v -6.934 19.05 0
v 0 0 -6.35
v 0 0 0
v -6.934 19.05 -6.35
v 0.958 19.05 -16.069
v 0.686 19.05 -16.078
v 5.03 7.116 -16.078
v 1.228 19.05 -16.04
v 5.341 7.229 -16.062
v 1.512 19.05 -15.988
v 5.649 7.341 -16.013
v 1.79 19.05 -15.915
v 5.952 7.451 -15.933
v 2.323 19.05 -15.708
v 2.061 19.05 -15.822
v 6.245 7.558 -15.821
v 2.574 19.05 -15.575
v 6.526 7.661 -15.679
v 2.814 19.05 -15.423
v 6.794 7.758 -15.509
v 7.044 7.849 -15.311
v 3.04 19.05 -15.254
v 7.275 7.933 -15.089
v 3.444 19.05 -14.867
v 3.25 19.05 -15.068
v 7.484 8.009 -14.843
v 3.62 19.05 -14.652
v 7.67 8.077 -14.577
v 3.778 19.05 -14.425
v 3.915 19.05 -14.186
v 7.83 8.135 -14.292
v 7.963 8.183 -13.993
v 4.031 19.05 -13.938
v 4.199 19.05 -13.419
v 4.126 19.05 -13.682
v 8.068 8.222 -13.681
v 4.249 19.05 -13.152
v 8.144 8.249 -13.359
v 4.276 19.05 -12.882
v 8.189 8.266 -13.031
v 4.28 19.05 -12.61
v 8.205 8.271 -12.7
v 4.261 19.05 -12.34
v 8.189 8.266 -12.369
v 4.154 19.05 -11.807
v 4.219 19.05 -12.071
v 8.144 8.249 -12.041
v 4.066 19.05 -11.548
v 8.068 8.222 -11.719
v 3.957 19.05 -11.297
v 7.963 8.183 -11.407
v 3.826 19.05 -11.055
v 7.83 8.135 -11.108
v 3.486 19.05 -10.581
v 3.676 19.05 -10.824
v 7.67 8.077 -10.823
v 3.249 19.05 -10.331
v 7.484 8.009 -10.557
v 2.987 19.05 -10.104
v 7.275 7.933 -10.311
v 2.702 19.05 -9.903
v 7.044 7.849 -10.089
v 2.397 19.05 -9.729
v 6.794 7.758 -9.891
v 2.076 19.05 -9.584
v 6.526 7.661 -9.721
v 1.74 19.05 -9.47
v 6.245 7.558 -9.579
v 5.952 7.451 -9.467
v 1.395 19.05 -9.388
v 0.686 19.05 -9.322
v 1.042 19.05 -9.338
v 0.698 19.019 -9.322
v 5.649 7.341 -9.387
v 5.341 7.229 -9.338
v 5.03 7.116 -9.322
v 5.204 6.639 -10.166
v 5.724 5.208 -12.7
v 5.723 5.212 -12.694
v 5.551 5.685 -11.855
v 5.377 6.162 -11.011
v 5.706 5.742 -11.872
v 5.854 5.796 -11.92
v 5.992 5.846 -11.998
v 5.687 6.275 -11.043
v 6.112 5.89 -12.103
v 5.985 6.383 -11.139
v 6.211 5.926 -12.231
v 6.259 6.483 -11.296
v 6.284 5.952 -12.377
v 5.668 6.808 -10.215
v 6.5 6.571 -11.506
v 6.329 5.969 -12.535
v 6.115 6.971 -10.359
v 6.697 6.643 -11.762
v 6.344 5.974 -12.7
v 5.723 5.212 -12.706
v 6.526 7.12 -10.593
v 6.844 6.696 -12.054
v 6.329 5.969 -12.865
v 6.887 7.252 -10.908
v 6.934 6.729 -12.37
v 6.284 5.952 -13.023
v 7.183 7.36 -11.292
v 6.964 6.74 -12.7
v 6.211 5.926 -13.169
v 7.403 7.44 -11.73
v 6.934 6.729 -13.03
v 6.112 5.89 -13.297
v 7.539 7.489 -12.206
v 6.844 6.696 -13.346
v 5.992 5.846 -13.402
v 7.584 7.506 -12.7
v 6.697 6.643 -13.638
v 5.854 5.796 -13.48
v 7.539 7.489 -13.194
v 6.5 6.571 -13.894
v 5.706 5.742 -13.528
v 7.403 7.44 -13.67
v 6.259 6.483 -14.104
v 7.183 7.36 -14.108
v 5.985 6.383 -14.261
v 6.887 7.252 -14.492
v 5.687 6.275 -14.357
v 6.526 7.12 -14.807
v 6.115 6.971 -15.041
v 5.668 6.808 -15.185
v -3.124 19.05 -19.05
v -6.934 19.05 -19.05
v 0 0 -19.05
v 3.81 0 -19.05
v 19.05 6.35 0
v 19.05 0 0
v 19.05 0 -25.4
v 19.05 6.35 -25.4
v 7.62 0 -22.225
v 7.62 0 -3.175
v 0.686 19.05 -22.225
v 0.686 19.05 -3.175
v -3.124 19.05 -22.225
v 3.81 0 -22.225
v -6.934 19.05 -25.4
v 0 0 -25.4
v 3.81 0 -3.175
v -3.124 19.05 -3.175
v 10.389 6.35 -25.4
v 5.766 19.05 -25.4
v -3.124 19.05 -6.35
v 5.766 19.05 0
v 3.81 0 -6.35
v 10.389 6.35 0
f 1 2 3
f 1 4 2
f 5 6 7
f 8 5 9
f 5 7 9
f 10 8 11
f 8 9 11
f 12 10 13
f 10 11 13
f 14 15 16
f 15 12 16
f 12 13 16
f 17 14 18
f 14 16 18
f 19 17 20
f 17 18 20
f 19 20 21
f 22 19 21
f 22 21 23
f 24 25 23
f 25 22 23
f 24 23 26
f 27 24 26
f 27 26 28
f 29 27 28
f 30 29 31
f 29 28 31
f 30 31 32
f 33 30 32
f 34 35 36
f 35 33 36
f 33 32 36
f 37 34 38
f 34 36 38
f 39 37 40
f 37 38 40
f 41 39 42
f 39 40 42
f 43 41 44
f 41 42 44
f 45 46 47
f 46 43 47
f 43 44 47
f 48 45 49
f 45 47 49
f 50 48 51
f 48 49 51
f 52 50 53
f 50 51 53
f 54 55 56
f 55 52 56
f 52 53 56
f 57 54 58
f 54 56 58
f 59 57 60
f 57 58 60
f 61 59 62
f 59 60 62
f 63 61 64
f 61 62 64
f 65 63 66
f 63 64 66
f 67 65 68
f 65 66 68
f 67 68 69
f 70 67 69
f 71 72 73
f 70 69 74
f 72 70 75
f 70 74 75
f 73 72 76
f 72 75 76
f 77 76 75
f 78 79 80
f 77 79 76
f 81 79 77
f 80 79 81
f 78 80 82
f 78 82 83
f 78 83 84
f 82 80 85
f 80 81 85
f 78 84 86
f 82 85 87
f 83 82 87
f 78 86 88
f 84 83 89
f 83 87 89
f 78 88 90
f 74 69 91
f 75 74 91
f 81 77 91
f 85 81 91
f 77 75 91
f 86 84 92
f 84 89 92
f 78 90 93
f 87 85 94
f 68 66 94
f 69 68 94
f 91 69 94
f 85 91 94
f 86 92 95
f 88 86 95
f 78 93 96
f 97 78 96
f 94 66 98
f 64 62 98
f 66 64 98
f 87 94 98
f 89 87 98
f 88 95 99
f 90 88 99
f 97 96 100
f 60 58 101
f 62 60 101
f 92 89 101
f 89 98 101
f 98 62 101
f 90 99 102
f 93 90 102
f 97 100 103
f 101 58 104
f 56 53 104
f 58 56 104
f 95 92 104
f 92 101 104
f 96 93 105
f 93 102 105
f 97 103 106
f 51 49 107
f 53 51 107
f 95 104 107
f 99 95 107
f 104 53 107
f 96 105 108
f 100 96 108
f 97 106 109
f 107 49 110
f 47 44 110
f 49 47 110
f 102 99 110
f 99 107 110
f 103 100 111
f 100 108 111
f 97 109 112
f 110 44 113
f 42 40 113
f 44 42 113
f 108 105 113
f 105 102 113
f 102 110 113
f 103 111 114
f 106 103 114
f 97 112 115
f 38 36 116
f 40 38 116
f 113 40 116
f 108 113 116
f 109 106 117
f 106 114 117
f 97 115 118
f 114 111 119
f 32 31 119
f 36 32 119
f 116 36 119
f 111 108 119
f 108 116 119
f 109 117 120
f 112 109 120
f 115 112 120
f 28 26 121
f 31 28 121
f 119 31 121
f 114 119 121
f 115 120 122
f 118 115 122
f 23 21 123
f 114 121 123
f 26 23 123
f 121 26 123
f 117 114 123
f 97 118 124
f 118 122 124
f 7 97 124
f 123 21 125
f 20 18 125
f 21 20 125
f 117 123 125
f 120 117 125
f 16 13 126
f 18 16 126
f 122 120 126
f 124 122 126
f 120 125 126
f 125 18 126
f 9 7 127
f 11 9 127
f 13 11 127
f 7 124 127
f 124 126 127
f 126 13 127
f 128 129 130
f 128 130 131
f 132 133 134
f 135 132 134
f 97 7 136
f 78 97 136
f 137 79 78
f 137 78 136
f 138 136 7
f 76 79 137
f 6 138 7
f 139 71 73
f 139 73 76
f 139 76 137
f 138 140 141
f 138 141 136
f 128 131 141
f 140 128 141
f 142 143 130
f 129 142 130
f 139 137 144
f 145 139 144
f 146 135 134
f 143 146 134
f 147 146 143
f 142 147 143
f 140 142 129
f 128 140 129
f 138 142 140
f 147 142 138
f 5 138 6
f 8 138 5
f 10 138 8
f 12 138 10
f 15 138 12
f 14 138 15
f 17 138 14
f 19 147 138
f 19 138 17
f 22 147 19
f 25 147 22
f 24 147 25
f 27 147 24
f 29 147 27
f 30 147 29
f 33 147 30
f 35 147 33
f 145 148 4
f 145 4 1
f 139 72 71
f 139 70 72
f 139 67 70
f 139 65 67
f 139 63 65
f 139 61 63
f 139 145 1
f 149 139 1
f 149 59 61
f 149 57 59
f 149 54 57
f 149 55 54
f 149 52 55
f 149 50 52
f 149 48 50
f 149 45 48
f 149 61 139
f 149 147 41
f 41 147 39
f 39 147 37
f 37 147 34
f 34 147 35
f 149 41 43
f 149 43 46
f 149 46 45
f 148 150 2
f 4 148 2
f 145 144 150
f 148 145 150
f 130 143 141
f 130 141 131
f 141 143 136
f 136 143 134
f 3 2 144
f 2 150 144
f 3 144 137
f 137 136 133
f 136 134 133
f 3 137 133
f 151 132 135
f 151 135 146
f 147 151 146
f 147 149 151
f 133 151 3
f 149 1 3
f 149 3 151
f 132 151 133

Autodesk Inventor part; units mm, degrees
sketch "Sketch1" plane through (0, 0, 0) normal (0, 1, 0) x (-1, 0, 0)
  line L0 (0, 0) -> (-19.05, 0)
  line L1 (-19.05, 0) -> (-19.05, -25.4)
  line L2 (-19.05, -25.4) -> (0, -25.4)
  line L3 (0, -25.4) -> (0, 0)
  line L4 (0, -12.7) -> (-19.05, -12.7) construction
  line L5 (-3.81, -25.4) -> (-3.81, 0)
  line L6 (-12.7, -25.4) -> (-12.7, 0)
  line L7 (-7.62, -25.4) -> (-7.62, 0)
  line L8 (0, -19.05) -> (-3.81, -19.05)
  line L9 (-3.81, -22.225) -> (-7.62, -22.225)
  line L10 (0, -6.35) -> (-3.81, -6.35)
  line L11 (-3.81, -3.175) -> (-7.62, -3.175)
  point P0 (-3.81, -12.7)
  point P1 (-3.81, -6.35)
  point P2 (0, -6.35)
  point P3 (-7.62, -3.175)
  point P4 (-3.81, -3.175)
  dimension "d7" = 25.4
  dimension "d34" = 3.81
  dimension "d57" = 6.35
  dimension "d68" = 3.81
  dimension "d69" = 12.7
  dimension "d70" = 19.05
  dimension "d72" = 12.7
sketch "Sketch8" plane through (0, 0, 0) normal (0, 0, 1) x (1, 0, 0)
  line L0 (0, 0) -> (-6.9336, 19.05)
  line L1 (0, 0) -> (20.2726, 0) construction
  dimension "d53" = 110
  dimension "d54" = 19.05
sweep "Sweep3" add profiles "Sketch1" path "Sketch8" contours L3 L10 L5 L0 | L5 L11 L7 L0 | L7 L2 L6 L0 | L3 L2 L5 L8 | L9 L5 L2 L7
extrude "Extrusion3" add sketch "Sketch1" along normal blind 6.35 contours L7 L2 L6 L0 | L6 L2 L1 L0
ref_plane "Work Plane6" through (0.6864, 19.05, -25.4) normal (0.342, -0.9397, 0) x (0, 0, 1)
sketch "Sketch9" plane through (0.6864, 19.05, -25.4) normal (0.342, -0.9397, 0) x (0, 0, 1)
  line L0 (3.175, 0) -> (22.225, 0) construction
  point P0 (12.7, 0)
hole "Hole4" at (0.6864, 19.05, -12.7) direction (0.342, -0.9397, 0) diameter 6.7564 depth 12.7 tip angle 118
ref_plane "Work Plane7" through (-6.9336, 19.05, -25.4) normal (-1, 0, 0) x (0, 0, 1)
ref_plane "Work Plane8" through (0, 0, -6.35) normal (0, -1, 0) x (1, 0, 0)
ref_plane "Work Plane9" through (-6.9336, 19.05, -25.4) normal (-0.342, 0.9397, 0) x (0, 0, 1)
ref_plane "Work Plane10" through (10.3888, 6.35, -6.35) normal (0.342, -0.9397, 0) x (0, 0, -1)
equation "\"d34\" = slotWidth"
equation "\"d68\" = d34"
equation "\"slopeAngle\" = 70deg"
equation "\"slotWidth\" = 3.81"
properties material "Steel, Alloy"
